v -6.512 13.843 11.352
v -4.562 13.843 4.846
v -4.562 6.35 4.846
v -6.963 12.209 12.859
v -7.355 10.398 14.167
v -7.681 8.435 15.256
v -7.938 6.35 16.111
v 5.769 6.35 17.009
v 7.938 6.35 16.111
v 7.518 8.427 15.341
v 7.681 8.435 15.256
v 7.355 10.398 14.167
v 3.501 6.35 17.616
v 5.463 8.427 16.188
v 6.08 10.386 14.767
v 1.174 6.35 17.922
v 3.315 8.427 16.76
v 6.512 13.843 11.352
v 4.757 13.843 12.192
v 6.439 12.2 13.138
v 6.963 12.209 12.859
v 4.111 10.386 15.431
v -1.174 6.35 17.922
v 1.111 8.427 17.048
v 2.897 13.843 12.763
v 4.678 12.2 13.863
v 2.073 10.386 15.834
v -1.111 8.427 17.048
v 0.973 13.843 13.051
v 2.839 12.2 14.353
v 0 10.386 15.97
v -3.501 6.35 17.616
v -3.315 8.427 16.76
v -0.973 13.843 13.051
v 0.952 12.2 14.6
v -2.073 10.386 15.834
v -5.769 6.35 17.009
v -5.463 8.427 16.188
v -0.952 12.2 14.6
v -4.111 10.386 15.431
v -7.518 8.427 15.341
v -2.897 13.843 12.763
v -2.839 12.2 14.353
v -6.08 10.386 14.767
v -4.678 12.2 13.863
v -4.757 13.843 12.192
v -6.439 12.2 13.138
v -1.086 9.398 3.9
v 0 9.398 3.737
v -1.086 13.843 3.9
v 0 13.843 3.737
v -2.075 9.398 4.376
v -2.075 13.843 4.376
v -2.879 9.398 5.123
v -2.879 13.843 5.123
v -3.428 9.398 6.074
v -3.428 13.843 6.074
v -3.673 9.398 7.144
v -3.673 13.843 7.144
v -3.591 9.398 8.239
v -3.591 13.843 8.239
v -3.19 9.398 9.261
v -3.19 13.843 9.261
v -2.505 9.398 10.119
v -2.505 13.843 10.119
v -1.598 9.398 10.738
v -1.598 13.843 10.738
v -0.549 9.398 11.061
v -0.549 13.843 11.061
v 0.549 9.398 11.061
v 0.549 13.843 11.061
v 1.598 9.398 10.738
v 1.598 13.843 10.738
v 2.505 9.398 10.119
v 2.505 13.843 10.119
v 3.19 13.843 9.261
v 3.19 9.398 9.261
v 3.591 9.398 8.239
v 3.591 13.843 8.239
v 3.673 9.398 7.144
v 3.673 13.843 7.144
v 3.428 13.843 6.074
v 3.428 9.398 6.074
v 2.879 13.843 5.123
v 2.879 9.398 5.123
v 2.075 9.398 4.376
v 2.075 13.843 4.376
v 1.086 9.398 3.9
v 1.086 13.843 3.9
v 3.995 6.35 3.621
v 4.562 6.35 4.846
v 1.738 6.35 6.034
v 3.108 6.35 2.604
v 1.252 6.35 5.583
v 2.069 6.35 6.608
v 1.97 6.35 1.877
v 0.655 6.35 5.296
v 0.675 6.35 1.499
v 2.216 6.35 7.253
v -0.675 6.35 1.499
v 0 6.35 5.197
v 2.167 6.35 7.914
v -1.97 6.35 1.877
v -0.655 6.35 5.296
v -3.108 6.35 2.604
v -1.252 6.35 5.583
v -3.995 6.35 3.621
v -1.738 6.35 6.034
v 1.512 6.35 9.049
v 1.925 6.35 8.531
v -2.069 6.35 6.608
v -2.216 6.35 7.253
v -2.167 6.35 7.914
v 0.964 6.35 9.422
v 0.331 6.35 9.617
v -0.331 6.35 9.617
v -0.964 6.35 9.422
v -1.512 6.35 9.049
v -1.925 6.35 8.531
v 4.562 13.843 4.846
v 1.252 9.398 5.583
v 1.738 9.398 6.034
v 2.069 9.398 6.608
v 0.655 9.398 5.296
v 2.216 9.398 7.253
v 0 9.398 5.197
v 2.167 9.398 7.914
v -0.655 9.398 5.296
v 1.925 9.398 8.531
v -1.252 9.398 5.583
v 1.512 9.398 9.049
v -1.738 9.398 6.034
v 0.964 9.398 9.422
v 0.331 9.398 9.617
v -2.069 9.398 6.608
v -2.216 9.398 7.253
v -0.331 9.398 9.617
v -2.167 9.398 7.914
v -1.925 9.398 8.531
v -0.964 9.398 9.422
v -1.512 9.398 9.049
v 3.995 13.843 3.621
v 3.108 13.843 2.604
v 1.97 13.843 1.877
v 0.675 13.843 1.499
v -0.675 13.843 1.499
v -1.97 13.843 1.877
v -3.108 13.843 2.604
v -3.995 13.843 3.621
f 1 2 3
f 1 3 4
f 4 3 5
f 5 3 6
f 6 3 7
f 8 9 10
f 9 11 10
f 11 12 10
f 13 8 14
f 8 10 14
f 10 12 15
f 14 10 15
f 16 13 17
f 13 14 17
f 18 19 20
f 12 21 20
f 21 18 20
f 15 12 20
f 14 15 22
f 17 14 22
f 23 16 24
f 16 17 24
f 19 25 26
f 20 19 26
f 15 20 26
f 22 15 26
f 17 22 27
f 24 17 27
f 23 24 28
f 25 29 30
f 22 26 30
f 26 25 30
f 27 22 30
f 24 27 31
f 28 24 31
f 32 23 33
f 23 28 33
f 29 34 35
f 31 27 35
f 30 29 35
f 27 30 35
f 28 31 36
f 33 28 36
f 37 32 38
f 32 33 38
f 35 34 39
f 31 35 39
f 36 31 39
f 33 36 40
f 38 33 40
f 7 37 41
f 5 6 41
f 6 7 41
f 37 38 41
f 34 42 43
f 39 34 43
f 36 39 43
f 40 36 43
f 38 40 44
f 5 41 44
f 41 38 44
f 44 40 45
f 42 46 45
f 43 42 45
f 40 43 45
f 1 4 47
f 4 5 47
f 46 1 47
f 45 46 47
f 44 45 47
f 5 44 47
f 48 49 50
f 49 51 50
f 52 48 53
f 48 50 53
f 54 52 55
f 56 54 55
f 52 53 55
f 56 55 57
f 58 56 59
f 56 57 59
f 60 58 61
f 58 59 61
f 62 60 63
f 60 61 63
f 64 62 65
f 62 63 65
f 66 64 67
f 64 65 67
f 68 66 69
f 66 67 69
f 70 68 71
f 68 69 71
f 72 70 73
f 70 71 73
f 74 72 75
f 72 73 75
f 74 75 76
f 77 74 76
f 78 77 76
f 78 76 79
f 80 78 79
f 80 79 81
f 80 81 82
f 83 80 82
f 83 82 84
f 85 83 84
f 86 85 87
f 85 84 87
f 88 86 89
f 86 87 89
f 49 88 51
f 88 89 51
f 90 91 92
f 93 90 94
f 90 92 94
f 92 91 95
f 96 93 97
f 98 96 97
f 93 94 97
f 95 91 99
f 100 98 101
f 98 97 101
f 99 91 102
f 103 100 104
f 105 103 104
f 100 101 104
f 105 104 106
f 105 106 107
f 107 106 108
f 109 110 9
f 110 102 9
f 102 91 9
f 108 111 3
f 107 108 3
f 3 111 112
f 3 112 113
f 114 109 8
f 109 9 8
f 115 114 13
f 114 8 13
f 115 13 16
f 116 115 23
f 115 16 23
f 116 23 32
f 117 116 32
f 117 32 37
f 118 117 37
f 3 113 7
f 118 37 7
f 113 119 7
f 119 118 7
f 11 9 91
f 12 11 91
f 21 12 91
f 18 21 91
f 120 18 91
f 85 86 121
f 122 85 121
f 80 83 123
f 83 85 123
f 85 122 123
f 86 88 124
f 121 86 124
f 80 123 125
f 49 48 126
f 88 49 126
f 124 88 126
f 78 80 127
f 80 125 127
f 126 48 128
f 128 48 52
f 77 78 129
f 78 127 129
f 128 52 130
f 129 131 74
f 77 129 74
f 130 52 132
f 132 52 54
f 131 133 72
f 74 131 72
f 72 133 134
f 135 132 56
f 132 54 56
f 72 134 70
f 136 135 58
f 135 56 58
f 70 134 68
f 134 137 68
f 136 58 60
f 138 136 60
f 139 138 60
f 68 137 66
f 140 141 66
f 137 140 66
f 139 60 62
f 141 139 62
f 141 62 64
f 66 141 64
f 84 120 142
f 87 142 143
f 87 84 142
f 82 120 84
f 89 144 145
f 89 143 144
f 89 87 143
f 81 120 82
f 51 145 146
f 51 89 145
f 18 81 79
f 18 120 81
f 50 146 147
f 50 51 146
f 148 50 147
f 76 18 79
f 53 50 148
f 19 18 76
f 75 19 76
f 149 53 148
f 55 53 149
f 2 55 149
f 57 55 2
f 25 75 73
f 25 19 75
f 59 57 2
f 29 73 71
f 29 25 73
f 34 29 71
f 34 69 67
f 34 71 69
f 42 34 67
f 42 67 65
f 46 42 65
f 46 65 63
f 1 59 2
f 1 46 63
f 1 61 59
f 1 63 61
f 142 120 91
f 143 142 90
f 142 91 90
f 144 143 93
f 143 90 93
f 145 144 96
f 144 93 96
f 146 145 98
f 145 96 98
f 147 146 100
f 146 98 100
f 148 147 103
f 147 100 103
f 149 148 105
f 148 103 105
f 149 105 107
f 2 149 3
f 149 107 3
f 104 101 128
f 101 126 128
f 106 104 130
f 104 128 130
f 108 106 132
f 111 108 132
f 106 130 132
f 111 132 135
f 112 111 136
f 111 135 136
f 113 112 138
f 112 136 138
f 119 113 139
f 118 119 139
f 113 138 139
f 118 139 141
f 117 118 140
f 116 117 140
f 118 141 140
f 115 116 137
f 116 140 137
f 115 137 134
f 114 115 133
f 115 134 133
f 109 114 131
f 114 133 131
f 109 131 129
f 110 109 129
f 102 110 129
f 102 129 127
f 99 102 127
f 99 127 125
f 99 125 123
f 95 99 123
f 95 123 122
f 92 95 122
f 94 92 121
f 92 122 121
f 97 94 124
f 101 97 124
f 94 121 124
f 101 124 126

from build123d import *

# Parameters (mm, degrees)
CUT_EXTRUDE1_DEPTH = 8.493


with BuildPart() as part:
    # Sketch1 → Revolve1 (revolve)
    with BuildSketch(Plane.XY):
        with BuildLine():
            Line((0, 0), (19.05, 0))
            ThreePointArc((19.05, 0), (13.470384182, 13.470384182), (0, 19.05))
            Line((0, 19.05), (0, 0))
        make_face()
    revolve(axis=Axis((0, 19.05, 0), (0, -1, 0)))

    # SurfaceCut1
    split(bisect_by=Plane(origin=(0, 13.843, 0), x_dir=(-1, 0, 0), z_dir=(0, 1, 0)), keep=Keep.BOTTOM)

    # SurfaceCut2
    split(bisect_by=Plane(origin=(0, 6.35, 0), x_dir=(-1, 0, 0), z_dir=(0, 1, 0)), keep=Keep.TOP)

    # Sketch2 → Cut-Extrude1 (cut, through all)
    with BuildSketch(Plane(origin=(0, 6.35, 0), x_dir=(-1, 0, 0), z_dir=(0, 1, 0))):
        with BuildLine():
            Line((4.562115728, 4.846079058), (7.9375, 16.11136536))
            ThreePointArc((7.9375, 16.11136536), (0, -17.960512242), (-7.9375, 16.11136536))
            Line((-7.9375, 16.11136536), (-4.562115728, 4.846079058))
            ThreePointArc((-4.562115728, 4.846079058), (0, 1.450512242), (4.562115728, 4.846079058))
        make_face()
    extrude(amount=CUT_EXTRUDE1_DEPTH, mode=Mode.SUBTRACT)

    # Sketch4 → Cut-Revolve1 (revolve, cut)
    with BuildSketch(Plane(origin=(0, 0, 0), x_dir=(0, 0, -1), z_dir=(1, 0, 0))):
        Polygon((-7.419512242, 13.843), (-7.419512242, 6.35), (-5.197012242, 6.35), (-5.197012242, 9.398), (-3.736512242, 9.398), (-3.736512242, 13.843), align=None)
    revolve(axis=Axis((0, 6.35, 7.419512242), (0, 1, 0)), mode=Mode.SUBTRACT)


solid = part.part
